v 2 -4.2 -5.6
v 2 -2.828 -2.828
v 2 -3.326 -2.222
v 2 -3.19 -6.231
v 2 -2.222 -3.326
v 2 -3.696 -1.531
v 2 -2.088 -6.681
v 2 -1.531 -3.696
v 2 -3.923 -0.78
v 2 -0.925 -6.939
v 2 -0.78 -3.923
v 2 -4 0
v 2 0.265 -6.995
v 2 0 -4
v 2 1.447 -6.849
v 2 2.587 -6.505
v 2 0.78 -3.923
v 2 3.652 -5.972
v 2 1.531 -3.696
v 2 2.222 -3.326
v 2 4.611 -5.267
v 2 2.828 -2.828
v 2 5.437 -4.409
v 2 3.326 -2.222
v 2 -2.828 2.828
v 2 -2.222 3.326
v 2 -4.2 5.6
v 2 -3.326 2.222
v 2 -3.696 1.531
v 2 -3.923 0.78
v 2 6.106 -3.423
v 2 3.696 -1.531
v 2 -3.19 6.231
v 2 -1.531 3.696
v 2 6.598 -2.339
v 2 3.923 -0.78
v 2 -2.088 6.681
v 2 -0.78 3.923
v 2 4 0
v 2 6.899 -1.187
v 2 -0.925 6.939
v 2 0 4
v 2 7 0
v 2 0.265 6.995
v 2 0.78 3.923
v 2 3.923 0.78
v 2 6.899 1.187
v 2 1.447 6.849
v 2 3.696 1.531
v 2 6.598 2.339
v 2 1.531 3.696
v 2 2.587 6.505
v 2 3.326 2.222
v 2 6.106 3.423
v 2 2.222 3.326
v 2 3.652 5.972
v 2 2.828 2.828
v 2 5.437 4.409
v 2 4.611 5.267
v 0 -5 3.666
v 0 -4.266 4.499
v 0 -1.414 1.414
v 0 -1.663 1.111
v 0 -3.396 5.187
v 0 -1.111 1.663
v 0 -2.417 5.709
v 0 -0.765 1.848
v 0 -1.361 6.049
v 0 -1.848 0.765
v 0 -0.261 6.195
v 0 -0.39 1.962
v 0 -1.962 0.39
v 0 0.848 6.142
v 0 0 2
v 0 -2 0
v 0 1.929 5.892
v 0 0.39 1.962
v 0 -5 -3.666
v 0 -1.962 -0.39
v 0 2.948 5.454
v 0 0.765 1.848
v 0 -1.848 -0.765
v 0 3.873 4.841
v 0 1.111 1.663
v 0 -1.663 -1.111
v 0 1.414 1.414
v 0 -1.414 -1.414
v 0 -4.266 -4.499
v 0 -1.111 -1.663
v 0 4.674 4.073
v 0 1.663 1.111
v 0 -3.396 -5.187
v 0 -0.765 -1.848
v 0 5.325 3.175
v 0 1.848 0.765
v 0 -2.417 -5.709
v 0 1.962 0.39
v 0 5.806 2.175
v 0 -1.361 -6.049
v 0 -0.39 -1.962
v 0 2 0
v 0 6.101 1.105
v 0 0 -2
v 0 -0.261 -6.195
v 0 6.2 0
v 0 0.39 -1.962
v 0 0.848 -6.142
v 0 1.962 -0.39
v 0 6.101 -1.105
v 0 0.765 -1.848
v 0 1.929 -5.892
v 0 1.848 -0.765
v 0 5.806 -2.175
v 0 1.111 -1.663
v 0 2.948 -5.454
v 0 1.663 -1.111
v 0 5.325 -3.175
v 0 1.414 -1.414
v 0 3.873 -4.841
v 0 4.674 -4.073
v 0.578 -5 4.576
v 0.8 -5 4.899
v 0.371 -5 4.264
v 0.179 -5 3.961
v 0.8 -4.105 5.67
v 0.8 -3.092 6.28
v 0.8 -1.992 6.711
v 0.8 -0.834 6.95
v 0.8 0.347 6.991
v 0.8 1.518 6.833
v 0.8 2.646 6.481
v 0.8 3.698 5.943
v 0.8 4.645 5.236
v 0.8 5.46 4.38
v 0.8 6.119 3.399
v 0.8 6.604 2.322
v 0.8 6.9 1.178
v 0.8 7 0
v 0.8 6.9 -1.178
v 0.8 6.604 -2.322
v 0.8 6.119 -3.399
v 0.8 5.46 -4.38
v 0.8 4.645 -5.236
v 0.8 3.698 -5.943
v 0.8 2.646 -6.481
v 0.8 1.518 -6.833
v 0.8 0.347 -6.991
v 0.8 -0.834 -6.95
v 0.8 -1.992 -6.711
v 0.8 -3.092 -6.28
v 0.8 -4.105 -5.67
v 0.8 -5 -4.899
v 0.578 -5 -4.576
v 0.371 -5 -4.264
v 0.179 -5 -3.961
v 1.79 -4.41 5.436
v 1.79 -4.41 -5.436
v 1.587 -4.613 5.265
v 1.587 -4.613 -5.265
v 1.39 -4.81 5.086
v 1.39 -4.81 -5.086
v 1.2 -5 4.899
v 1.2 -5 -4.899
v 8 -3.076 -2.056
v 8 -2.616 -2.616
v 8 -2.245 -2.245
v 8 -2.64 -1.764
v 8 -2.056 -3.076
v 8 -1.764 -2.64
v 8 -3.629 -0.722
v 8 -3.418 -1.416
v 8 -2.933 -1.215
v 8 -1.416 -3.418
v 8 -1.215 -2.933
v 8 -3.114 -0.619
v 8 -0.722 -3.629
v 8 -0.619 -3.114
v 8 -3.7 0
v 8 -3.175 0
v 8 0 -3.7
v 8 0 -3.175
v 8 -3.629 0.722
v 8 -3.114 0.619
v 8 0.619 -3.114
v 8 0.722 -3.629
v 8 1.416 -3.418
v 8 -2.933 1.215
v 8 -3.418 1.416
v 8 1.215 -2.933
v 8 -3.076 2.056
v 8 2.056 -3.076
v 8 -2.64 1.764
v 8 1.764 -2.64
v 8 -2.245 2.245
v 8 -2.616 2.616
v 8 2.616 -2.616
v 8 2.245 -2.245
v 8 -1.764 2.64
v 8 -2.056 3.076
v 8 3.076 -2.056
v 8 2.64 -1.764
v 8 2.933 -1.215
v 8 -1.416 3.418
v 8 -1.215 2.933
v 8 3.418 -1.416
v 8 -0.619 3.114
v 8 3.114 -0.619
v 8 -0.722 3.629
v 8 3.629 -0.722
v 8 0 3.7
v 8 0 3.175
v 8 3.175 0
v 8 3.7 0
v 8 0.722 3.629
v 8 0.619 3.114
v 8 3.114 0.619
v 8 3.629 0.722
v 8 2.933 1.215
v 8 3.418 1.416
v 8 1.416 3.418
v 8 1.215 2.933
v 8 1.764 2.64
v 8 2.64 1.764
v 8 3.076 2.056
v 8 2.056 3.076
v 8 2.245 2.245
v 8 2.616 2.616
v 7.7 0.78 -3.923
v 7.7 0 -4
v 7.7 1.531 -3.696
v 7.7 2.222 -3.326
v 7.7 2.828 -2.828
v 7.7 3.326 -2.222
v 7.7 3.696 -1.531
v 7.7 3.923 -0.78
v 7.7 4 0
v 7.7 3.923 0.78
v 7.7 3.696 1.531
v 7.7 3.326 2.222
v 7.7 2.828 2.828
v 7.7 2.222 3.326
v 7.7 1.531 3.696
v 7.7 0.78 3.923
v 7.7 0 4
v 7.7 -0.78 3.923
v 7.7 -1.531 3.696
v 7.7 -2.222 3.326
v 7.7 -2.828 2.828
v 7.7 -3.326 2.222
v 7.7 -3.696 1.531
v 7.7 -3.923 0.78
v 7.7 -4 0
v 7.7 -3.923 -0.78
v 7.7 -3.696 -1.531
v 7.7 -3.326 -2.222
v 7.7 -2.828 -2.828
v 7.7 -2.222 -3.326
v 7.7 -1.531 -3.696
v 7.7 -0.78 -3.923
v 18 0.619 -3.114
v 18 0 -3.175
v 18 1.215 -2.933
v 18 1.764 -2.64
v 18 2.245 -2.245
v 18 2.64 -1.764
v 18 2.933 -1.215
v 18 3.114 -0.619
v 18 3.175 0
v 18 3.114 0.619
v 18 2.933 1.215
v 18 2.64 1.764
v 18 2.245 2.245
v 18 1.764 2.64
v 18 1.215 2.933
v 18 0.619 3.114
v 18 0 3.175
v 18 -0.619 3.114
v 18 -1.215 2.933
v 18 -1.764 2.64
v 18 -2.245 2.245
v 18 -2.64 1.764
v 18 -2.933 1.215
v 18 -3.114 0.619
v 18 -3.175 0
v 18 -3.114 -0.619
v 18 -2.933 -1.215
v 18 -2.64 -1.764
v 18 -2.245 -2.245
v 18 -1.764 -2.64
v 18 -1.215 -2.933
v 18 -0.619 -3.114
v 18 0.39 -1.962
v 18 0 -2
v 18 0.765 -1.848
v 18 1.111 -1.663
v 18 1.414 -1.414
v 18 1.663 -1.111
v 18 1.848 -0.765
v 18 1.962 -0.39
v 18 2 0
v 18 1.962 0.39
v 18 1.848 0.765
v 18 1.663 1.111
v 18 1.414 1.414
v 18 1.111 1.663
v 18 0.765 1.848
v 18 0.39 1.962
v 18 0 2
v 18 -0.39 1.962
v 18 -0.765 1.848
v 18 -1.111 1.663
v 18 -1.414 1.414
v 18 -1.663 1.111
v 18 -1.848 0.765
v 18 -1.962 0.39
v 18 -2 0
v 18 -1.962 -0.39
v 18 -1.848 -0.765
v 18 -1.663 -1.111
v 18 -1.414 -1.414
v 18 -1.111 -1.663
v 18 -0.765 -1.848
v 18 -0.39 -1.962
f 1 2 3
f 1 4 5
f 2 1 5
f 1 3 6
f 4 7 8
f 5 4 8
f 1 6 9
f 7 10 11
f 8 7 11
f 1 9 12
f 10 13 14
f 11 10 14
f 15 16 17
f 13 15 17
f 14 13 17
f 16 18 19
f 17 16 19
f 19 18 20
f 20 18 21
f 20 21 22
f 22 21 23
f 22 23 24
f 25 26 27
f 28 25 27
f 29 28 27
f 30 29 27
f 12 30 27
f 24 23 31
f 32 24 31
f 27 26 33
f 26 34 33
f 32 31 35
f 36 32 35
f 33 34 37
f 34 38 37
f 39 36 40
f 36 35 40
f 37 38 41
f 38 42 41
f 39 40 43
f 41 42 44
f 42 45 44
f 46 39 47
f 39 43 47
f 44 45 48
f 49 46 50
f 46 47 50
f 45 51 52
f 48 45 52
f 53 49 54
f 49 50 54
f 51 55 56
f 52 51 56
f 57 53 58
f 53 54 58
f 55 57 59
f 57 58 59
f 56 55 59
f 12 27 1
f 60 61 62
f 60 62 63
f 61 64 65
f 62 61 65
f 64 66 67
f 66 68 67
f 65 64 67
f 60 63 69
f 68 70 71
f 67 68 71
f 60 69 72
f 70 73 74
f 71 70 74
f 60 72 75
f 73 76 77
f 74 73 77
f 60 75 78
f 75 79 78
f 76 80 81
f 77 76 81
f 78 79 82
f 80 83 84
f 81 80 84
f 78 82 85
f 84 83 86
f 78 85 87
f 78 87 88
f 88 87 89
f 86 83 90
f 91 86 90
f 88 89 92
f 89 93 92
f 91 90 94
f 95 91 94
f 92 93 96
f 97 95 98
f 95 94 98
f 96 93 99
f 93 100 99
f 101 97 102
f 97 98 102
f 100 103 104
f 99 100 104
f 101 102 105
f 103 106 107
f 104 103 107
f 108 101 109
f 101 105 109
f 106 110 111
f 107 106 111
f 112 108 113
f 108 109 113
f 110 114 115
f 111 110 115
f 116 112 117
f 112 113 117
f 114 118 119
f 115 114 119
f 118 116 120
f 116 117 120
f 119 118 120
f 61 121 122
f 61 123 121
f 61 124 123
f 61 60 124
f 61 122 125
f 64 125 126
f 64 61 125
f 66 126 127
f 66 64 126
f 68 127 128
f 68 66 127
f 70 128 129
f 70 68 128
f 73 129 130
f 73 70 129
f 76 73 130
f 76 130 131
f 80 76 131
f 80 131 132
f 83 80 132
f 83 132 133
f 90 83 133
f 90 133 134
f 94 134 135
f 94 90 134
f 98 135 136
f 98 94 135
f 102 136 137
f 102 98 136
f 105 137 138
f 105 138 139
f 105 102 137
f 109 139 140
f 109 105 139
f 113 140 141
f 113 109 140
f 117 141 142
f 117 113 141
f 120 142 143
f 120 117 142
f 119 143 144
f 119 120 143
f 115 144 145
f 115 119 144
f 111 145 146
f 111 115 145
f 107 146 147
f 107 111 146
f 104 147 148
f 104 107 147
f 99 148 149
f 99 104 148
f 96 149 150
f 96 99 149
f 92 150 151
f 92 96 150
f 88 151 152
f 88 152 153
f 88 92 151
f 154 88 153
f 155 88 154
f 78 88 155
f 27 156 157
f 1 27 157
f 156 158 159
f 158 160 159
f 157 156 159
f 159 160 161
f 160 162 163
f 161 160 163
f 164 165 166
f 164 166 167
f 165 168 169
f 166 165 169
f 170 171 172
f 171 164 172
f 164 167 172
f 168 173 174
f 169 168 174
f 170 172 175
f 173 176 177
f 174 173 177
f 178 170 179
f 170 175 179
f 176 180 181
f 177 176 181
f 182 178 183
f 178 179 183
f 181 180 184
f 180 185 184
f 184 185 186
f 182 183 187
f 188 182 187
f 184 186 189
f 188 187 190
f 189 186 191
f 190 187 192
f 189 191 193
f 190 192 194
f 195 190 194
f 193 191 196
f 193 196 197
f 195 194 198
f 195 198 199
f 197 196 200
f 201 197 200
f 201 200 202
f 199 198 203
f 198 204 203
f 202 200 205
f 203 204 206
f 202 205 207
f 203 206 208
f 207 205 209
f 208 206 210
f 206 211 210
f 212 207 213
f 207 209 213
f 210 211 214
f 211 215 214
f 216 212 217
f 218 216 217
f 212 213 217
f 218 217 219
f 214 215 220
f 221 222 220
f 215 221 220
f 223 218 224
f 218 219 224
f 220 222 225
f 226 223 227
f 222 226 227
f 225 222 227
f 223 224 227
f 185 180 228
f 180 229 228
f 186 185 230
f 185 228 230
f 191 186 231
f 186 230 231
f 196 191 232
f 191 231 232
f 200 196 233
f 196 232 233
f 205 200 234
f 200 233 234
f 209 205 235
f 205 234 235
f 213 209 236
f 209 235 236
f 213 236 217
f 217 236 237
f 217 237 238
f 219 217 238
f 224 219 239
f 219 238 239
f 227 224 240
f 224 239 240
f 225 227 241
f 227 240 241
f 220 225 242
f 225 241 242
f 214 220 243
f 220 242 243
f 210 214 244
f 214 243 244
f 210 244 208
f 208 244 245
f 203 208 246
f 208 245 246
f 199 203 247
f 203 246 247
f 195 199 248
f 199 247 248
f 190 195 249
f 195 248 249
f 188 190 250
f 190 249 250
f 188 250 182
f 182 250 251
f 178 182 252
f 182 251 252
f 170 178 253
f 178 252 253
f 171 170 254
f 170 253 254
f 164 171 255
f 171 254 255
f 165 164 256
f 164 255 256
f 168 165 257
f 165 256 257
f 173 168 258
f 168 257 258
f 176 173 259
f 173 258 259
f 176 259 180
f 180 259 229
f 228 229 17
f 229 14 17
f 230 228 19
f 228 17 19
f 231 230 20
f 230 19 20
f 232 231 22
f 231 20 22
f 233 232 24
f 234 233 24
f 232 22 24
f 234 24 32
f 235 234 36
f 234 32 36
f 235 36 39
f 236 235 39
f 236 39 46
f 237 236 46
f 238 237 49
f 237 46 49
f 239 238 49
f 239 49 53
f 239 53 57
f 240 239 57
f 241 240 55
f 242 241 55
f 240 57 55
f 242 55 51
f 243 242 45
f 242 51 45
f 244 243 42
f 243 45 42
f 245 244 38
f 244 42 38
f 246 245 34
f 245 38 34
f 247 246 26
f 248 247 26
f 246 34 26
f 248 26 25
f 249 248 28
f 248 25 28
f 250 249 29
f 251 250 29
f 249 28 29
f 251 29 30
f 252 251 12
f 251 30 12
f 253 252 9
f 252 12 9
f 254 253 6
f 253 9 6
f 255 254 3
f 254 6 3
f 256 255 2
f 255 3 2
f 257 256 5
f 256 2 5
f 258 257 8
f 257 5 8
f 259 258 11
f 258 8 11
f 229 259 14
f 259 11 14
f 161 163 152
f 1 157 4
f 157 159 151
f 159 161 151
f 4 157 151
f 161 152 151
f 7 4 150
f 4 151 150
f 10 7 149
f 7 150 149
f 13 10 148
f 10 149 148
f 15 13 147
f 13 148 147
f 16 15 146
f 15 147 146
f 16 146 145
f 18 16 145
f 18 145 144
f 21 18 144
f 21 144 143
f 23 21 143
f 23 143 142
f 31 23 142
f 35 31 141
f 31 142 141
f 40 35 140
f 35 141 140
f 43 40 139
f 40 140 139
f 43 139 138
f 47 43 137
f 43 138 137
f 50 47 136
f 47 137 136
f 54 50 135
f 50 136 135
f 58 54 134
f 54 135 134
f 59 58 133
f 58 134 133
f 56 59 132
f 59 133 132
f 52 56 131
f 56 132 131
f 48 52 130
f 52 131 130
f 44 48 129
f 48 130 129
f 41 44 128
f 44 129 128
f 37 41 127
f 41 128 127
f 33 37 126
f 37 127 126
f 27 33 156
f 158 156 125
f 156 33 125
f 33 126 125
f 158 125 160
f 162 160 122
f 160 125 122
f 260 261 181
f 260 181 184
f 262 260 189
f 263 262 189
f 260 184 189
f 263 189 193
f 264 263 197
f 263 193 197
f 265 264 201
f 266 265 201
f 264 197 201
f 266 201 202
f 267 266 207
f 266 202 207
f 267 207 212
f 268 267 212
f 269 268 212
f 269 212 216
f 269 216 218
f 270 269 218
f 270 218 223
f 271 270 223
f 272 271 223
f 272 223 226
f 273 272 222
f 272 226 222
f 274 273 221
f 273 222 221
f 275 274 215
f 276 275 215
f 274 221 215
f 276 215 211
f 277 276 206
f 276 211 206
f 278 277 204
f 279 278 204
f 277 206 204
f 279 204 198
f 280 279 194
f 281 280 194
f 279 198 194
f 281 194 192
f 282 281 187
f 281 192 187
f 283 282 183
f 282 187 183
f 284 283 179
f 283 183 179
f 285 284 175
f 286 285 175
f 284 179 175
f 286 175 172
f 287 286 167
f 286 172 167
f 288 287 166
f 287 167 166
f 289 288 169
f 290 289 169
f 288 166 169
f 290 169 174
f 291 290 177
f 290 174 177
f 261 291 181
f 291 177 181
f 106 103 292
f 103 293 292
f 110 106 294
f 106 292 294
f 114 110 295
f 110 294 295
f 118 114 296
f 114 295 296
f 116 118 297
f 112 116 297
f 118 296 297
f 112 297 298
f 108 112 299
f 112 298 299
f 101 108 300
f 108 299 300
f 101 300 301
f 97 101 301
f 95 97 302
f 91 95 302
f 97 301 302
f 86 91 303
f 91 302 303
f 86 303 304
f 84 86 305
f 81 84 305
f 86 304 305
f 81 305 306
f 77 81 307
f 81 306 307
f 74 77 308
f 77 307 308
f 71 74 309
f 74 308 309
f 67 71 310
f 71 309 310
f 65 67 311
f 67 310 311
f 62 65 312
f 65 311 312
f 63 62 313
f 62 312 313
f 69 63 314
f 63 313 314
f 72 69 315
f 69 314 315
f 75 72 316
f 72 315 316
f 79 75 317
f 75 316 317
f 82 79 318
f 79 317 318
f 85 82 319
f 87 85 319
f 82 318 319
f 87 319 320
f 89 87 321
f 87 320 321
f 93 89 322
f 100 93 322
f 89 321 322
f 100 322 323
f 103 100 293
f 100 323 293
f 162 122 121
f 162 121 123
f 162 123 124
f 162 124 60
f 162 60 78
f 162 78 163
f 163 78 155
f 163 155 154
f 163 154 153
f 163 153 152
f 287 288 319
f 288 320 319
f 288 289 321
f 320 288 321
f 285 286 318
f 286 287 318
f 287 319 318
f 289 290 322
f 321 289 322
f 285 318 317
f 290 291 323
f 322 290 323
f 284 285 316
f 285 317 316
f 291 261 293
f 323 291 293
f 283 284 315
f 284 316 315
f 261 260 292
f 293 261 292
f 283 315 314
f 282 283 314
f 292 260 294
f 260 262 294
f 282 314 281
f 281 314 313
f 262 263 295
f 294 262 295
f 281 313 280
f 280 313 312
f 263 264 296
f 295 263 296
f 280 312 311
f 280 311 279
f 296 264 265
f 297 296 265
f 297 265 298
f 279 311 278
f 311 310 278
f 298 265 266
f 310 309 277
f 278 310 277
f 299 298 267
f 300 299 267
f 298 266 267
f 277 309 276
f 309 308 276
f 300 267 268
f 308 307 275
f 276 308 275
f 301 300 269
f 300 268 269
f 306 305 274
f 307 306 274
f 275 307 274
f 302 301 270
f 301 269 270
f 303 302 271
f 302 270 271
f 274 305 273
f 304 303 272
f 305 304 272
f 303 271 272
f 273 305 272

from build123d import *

# Parameters (mm, degrees)
CUT_EXTRUDE_2_DEPTH = 19
CHAMFER_1_SIZE      = 0.8


with BuildPart() as part:
    # Эскиз1 → Повернуть1 (revolve)
    with BuildSketch(Plane(origin=(0, 0, 0), x_dir=(1, 0, 0), z_dir=(0, 1, 0))):
        Polygon((0, 2), (18, 2), (18, 3.175), (8, 3.175), (8, 3.7), (7.7, 4), (2, 4), (2, 7), (0, 7), align=None)
    revolve(axis=Axis((0, 0, 0), (1, 0, 0)))

    # Эскиз2 → Вырез-Вытянуть2 (cut, through all)
    with BuildSketch(Plane.ZY):
        with BuildLine():
            Line((4.898979486, -5), (-4.898979486, -5))
            ThreePointArc((-4.898979486, -5), (0, -7), (4.898979486, -5))
        make_face()
    extrude(amount=-CUT_EXTRUDE_2_DEPTH, mode=Mode.SUBTRACT)

    # Фаска1
    chamfer_1_edges = [part.edges().sort_by_distance(p)[0] for p in [
        (0, 7, 0),
        (2, -5, 0),
    ]]
    chamfer(chamfer_1_edges, length=CHAMFER_1_SIZE)


solid = part.part
